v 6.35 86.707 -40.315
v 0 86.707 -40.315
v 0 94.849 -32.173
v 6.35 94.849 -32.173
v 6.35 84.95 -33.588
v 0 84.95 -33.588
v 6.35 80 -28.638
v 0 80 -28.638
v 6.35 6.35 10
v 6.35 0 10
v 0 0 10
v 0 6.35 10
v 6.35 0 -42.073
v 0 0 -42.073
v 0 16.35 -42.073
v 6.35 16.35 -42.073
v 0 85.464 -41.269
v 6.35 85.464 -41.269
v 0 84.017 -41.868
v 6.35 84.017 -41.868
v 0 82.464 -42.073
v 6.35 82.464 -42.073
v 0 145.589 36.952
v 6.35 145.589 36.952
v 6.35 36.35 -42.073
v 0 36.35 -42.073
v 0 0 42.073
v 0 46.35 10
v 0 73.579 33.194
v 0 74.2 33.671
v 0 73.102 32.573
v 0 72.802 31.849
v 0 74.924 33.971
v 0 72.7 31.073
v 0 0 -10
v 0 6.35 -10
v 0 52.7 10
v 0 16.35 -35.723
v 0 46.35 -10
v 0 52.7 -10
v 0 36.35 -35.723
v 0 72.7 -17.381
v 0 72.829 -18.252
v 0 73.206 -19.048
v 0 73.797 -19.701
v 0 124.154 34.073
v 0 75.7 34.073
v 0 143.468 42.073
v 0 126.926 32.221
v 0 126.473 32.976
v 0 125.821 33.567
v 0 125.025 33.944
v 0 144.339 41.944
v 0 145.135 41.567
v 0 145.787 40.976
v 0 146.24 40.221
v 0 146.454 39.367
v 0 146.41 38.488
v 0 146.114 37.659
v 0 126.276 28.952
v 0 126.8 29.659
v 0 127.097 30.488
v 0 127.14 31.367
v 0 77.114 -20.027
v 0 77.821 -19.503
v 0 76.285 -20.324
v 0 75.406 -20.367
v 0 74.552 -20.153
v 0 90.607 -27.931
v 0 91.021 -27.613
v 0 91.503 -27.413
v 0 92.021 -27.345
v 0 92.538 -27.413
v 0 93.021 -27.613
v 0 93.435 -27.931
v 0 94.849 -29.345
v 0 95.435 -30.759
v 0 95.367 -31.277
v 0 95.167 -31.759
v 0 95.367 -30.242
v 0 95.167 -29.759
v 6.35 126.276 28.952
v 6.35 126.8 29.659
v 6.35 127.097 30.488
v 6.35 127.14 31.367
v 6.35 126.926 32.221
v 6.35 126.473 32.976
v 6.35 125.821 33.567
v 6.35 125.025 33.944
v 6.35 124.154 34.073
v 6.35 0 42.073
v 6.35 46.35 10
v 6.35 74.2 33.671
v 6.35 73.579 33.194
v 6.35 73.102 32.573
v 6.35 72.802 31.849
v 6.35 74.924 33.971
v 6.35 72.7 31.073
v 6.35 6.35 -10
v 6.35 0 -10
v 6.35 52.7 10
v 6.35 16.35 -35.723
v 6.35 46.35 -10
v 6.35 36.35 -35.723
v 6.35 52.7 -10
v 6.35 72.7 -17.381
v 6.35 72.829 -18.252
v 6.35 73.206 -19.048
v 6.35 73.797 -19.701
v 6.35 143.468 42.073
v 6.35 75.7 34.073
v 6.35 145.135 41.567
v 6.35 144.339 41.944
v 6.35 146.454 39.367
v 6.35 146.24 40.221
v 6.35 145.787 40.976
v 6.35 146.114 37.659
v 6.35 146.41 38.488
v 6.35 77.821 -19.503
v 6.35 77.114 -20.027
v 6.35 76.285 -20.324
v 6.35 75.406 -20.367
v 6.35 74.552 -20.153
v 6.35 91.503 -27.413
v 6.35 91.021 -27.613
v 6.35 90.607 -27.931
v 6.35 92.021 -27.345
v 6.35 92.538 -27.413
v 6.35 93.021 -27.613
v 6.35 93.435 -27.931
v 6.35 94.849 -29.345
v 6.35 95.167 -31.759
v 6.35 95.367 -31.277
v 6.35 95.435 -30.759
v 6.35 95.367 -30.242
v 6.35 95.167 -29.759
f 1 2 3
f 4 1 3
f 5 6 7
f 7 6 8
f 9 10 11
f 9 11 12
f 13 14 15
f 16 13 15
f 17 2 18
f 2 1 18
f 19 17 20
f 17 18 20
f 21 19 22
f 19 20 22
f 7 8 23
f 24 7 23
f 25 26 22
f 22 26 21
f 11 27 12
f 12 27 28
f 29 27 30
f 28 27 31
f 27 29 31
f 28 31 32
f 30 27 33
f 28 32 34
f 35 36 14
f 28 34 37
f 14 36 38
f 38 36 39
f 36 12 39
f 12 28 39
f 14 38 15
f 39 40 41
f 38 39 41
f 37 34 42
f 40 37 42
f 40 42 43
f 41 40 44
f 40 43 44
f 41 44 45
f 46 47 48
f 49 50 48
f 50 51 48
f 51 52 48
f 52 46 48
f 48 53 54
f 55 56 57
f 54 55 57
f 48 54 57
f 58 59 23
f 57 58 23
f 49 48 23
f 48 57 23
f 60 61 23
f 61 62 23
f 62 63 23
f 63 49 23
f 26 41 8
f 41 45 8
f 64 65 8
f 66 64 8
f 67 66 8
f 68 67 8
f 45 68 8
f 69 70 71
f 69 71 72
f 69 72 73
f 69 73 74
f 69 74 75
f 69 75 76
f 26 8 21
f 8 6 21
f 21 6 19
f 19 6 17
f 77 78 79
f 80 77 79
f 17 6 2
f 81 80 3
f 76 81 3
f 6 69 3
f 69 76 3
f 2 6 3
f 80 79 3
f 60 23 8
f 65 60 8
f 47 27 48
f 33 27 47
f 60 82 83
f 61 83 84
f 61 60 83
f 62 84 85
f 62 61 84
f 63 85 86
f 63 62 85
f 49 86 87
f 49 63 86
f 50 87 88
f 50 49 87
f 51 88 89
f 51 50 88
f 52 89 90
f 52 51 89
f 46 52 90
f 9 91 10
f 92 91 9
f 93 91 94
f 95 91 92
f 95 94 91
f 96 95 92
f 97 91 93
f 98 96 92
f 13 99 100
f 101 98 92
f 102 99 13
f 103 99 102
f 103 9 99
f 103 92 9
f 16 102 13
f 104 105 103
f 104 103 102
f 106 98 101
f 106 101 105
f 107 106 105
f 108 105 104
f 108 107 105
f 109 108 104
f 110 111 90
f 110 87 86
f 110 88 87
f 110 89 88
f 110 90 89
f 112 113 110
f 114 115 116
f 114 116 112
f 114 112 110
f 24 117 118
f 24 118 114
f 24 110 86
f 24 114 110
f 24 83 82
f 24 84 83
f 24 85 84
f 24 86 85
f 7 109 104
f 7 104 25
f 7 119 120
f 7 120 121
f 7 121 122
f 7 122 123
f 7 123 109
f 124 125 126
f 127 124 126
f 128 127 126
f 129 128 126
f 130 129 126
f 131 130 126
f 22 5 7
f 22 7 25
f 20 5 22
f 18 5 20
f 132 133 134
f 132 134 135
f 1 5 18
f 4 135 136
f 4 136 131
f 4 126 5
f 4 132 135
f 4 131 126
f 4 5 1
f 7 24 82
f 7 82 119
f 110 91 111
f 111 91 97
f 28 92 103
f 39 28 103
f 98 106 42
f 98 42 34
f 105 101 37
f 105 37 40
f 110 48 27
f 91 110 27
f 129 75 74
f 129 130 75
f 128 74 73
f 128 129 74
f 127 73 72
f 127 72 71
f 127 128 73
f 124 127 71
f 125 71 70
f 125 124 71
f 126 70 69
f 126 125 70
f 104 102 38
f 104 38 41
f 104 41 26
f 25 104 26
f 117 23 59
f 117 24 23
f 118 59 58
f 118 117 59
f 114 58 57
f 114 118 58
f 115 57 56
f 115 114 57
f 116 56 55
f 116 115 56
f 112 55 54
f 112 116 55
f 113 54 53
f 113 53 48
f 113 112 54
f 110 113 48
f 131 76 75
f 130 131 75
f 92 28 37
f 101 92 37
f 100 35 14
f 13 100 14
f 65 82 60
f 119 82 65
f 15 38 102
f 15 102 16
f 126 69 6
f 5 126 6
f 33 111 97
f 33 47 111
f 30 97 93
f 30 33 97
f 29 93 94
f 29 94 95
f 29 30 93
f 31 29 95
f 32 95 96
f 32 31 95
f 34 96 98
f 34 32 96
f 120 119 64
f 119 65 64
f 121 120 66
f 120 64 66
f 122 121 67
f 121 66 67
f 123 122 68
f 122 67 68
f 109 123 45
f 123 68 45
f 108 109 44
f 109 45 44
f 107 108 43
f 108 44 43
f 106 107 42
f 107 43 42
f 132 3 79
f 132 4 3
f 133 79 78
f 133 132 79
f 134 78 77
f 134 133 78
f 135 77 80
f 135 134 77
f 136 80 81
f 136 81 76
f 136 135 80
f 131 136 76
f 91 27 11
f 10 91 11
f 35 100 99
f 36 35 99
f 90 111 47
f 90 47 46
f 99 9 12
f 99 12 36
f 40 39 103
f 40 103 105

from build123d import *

# Parameters (mm, degrees)
BOSS_EXTRU_1_DEPTH      = 6.35
ESQUISSE2_W             = 20
ESQUISSE2_H             = 6.35
ESQUISSE2_W_2           = 6.35
ESQUISSE2_H_2           = 20
ENL_V_MAT_EXTRU_1_DEPTH = 157.601902923
CONG_1_R                = 6
CONG_2_R                = 2
ENL_V_MAT_EXTRU_2_DEPTH = 157.601902923
CONG_4_R                = 3


with BuildPart() as part:
    # Esquisse1 → Boss.-Extru.1 (new body)
    with BuildSketch(Plane(origin=(0, 0, 0), x_dir=(0, 0, -1), z_dir=(1, 0, 0))):
        Polygon((-42.072853481, 0), (42.072853481, 0), (42.072853481, 84.949747468), (30.759144982, 96.263455967), (26.516504294, 92.02081528), (33.587572106, 84.949747468), (28.637824638, 80), (-42.072853481, 150.710678119), align=None)
    extrude(amount=BOSS_EXTRU_1_DEPTH)

    # Esquisse2 → Enlèv. mat.-Extru.1 (cut, through all)
    with BuildSketch(Plane(origin=(6.35, 0, 0), x_dir=(0, 0, -1), z_dir=(1, 0, 0))):
        with Locations((0, 3.175)):
            Rectangle(ESQUISSE2_W, ESQUISSE2_H)
        with Locations((0, 49.525)):
            Rectangle(ESQUISSE2_W, ESQUISSE2_H)
        with Locations((38.897853481, 26.35)):
            Rectangle(ESQUISSE2_W_2, ESQUISSE2_H_2)
    extrude(amount=-ENL_V_MAT_EXTRU_1_DEPTH, mode=Mode.SUBTRACT)

    # Congé1
    cong_1_edges = [part.edges().sort_by_distance(p)[0] for p in [
        (3.175, 84.949747468, -42.072853481),
    ]]
    fillet(cong_1_edges, radius=CONG_1_R)

    # Congé2
    cong_2_edges = [part.edges().sort_by_distance(p)[0] for p in [
        (3.175, 92.02081528, -26.516504294),
        (3.175, 96.263455967, -30.759144982),
    ]]
    fillet(cong_2_edges, radius=CONG_2_R)

    # Esquisse4 → Enlèv. mat.-Extru.2 (cut, through all)
    with BuildSketch(Plane(origin=(6.35, 0, 0), x_dir=(0, 0, -1), z_dir=(1, 0, 0))):
        Polygon((24.624116139, 72.7), (-34.072853481, 72.7), (-34.072853481, 131.39696962), align=None)
    extrude(amount=-ENL_V_MAT_EXTRU_2_DEPTH, mode=Mode.SUBTRACT)

    # Congé4
    cong_4_edges = [part.edges().sort_by_distance(p)[0] for p in [
        (3.175, 150.710678119, 42.072853481),
        (3.175, 131.39696962, 34.072853481),
        (3.175, 72.7, -24.624116139),
        (3.175, 72.7, 34.072853481),
    ]]
    fillet(cong_4_edges, radius=CONG_4_R)


solid = part.part
